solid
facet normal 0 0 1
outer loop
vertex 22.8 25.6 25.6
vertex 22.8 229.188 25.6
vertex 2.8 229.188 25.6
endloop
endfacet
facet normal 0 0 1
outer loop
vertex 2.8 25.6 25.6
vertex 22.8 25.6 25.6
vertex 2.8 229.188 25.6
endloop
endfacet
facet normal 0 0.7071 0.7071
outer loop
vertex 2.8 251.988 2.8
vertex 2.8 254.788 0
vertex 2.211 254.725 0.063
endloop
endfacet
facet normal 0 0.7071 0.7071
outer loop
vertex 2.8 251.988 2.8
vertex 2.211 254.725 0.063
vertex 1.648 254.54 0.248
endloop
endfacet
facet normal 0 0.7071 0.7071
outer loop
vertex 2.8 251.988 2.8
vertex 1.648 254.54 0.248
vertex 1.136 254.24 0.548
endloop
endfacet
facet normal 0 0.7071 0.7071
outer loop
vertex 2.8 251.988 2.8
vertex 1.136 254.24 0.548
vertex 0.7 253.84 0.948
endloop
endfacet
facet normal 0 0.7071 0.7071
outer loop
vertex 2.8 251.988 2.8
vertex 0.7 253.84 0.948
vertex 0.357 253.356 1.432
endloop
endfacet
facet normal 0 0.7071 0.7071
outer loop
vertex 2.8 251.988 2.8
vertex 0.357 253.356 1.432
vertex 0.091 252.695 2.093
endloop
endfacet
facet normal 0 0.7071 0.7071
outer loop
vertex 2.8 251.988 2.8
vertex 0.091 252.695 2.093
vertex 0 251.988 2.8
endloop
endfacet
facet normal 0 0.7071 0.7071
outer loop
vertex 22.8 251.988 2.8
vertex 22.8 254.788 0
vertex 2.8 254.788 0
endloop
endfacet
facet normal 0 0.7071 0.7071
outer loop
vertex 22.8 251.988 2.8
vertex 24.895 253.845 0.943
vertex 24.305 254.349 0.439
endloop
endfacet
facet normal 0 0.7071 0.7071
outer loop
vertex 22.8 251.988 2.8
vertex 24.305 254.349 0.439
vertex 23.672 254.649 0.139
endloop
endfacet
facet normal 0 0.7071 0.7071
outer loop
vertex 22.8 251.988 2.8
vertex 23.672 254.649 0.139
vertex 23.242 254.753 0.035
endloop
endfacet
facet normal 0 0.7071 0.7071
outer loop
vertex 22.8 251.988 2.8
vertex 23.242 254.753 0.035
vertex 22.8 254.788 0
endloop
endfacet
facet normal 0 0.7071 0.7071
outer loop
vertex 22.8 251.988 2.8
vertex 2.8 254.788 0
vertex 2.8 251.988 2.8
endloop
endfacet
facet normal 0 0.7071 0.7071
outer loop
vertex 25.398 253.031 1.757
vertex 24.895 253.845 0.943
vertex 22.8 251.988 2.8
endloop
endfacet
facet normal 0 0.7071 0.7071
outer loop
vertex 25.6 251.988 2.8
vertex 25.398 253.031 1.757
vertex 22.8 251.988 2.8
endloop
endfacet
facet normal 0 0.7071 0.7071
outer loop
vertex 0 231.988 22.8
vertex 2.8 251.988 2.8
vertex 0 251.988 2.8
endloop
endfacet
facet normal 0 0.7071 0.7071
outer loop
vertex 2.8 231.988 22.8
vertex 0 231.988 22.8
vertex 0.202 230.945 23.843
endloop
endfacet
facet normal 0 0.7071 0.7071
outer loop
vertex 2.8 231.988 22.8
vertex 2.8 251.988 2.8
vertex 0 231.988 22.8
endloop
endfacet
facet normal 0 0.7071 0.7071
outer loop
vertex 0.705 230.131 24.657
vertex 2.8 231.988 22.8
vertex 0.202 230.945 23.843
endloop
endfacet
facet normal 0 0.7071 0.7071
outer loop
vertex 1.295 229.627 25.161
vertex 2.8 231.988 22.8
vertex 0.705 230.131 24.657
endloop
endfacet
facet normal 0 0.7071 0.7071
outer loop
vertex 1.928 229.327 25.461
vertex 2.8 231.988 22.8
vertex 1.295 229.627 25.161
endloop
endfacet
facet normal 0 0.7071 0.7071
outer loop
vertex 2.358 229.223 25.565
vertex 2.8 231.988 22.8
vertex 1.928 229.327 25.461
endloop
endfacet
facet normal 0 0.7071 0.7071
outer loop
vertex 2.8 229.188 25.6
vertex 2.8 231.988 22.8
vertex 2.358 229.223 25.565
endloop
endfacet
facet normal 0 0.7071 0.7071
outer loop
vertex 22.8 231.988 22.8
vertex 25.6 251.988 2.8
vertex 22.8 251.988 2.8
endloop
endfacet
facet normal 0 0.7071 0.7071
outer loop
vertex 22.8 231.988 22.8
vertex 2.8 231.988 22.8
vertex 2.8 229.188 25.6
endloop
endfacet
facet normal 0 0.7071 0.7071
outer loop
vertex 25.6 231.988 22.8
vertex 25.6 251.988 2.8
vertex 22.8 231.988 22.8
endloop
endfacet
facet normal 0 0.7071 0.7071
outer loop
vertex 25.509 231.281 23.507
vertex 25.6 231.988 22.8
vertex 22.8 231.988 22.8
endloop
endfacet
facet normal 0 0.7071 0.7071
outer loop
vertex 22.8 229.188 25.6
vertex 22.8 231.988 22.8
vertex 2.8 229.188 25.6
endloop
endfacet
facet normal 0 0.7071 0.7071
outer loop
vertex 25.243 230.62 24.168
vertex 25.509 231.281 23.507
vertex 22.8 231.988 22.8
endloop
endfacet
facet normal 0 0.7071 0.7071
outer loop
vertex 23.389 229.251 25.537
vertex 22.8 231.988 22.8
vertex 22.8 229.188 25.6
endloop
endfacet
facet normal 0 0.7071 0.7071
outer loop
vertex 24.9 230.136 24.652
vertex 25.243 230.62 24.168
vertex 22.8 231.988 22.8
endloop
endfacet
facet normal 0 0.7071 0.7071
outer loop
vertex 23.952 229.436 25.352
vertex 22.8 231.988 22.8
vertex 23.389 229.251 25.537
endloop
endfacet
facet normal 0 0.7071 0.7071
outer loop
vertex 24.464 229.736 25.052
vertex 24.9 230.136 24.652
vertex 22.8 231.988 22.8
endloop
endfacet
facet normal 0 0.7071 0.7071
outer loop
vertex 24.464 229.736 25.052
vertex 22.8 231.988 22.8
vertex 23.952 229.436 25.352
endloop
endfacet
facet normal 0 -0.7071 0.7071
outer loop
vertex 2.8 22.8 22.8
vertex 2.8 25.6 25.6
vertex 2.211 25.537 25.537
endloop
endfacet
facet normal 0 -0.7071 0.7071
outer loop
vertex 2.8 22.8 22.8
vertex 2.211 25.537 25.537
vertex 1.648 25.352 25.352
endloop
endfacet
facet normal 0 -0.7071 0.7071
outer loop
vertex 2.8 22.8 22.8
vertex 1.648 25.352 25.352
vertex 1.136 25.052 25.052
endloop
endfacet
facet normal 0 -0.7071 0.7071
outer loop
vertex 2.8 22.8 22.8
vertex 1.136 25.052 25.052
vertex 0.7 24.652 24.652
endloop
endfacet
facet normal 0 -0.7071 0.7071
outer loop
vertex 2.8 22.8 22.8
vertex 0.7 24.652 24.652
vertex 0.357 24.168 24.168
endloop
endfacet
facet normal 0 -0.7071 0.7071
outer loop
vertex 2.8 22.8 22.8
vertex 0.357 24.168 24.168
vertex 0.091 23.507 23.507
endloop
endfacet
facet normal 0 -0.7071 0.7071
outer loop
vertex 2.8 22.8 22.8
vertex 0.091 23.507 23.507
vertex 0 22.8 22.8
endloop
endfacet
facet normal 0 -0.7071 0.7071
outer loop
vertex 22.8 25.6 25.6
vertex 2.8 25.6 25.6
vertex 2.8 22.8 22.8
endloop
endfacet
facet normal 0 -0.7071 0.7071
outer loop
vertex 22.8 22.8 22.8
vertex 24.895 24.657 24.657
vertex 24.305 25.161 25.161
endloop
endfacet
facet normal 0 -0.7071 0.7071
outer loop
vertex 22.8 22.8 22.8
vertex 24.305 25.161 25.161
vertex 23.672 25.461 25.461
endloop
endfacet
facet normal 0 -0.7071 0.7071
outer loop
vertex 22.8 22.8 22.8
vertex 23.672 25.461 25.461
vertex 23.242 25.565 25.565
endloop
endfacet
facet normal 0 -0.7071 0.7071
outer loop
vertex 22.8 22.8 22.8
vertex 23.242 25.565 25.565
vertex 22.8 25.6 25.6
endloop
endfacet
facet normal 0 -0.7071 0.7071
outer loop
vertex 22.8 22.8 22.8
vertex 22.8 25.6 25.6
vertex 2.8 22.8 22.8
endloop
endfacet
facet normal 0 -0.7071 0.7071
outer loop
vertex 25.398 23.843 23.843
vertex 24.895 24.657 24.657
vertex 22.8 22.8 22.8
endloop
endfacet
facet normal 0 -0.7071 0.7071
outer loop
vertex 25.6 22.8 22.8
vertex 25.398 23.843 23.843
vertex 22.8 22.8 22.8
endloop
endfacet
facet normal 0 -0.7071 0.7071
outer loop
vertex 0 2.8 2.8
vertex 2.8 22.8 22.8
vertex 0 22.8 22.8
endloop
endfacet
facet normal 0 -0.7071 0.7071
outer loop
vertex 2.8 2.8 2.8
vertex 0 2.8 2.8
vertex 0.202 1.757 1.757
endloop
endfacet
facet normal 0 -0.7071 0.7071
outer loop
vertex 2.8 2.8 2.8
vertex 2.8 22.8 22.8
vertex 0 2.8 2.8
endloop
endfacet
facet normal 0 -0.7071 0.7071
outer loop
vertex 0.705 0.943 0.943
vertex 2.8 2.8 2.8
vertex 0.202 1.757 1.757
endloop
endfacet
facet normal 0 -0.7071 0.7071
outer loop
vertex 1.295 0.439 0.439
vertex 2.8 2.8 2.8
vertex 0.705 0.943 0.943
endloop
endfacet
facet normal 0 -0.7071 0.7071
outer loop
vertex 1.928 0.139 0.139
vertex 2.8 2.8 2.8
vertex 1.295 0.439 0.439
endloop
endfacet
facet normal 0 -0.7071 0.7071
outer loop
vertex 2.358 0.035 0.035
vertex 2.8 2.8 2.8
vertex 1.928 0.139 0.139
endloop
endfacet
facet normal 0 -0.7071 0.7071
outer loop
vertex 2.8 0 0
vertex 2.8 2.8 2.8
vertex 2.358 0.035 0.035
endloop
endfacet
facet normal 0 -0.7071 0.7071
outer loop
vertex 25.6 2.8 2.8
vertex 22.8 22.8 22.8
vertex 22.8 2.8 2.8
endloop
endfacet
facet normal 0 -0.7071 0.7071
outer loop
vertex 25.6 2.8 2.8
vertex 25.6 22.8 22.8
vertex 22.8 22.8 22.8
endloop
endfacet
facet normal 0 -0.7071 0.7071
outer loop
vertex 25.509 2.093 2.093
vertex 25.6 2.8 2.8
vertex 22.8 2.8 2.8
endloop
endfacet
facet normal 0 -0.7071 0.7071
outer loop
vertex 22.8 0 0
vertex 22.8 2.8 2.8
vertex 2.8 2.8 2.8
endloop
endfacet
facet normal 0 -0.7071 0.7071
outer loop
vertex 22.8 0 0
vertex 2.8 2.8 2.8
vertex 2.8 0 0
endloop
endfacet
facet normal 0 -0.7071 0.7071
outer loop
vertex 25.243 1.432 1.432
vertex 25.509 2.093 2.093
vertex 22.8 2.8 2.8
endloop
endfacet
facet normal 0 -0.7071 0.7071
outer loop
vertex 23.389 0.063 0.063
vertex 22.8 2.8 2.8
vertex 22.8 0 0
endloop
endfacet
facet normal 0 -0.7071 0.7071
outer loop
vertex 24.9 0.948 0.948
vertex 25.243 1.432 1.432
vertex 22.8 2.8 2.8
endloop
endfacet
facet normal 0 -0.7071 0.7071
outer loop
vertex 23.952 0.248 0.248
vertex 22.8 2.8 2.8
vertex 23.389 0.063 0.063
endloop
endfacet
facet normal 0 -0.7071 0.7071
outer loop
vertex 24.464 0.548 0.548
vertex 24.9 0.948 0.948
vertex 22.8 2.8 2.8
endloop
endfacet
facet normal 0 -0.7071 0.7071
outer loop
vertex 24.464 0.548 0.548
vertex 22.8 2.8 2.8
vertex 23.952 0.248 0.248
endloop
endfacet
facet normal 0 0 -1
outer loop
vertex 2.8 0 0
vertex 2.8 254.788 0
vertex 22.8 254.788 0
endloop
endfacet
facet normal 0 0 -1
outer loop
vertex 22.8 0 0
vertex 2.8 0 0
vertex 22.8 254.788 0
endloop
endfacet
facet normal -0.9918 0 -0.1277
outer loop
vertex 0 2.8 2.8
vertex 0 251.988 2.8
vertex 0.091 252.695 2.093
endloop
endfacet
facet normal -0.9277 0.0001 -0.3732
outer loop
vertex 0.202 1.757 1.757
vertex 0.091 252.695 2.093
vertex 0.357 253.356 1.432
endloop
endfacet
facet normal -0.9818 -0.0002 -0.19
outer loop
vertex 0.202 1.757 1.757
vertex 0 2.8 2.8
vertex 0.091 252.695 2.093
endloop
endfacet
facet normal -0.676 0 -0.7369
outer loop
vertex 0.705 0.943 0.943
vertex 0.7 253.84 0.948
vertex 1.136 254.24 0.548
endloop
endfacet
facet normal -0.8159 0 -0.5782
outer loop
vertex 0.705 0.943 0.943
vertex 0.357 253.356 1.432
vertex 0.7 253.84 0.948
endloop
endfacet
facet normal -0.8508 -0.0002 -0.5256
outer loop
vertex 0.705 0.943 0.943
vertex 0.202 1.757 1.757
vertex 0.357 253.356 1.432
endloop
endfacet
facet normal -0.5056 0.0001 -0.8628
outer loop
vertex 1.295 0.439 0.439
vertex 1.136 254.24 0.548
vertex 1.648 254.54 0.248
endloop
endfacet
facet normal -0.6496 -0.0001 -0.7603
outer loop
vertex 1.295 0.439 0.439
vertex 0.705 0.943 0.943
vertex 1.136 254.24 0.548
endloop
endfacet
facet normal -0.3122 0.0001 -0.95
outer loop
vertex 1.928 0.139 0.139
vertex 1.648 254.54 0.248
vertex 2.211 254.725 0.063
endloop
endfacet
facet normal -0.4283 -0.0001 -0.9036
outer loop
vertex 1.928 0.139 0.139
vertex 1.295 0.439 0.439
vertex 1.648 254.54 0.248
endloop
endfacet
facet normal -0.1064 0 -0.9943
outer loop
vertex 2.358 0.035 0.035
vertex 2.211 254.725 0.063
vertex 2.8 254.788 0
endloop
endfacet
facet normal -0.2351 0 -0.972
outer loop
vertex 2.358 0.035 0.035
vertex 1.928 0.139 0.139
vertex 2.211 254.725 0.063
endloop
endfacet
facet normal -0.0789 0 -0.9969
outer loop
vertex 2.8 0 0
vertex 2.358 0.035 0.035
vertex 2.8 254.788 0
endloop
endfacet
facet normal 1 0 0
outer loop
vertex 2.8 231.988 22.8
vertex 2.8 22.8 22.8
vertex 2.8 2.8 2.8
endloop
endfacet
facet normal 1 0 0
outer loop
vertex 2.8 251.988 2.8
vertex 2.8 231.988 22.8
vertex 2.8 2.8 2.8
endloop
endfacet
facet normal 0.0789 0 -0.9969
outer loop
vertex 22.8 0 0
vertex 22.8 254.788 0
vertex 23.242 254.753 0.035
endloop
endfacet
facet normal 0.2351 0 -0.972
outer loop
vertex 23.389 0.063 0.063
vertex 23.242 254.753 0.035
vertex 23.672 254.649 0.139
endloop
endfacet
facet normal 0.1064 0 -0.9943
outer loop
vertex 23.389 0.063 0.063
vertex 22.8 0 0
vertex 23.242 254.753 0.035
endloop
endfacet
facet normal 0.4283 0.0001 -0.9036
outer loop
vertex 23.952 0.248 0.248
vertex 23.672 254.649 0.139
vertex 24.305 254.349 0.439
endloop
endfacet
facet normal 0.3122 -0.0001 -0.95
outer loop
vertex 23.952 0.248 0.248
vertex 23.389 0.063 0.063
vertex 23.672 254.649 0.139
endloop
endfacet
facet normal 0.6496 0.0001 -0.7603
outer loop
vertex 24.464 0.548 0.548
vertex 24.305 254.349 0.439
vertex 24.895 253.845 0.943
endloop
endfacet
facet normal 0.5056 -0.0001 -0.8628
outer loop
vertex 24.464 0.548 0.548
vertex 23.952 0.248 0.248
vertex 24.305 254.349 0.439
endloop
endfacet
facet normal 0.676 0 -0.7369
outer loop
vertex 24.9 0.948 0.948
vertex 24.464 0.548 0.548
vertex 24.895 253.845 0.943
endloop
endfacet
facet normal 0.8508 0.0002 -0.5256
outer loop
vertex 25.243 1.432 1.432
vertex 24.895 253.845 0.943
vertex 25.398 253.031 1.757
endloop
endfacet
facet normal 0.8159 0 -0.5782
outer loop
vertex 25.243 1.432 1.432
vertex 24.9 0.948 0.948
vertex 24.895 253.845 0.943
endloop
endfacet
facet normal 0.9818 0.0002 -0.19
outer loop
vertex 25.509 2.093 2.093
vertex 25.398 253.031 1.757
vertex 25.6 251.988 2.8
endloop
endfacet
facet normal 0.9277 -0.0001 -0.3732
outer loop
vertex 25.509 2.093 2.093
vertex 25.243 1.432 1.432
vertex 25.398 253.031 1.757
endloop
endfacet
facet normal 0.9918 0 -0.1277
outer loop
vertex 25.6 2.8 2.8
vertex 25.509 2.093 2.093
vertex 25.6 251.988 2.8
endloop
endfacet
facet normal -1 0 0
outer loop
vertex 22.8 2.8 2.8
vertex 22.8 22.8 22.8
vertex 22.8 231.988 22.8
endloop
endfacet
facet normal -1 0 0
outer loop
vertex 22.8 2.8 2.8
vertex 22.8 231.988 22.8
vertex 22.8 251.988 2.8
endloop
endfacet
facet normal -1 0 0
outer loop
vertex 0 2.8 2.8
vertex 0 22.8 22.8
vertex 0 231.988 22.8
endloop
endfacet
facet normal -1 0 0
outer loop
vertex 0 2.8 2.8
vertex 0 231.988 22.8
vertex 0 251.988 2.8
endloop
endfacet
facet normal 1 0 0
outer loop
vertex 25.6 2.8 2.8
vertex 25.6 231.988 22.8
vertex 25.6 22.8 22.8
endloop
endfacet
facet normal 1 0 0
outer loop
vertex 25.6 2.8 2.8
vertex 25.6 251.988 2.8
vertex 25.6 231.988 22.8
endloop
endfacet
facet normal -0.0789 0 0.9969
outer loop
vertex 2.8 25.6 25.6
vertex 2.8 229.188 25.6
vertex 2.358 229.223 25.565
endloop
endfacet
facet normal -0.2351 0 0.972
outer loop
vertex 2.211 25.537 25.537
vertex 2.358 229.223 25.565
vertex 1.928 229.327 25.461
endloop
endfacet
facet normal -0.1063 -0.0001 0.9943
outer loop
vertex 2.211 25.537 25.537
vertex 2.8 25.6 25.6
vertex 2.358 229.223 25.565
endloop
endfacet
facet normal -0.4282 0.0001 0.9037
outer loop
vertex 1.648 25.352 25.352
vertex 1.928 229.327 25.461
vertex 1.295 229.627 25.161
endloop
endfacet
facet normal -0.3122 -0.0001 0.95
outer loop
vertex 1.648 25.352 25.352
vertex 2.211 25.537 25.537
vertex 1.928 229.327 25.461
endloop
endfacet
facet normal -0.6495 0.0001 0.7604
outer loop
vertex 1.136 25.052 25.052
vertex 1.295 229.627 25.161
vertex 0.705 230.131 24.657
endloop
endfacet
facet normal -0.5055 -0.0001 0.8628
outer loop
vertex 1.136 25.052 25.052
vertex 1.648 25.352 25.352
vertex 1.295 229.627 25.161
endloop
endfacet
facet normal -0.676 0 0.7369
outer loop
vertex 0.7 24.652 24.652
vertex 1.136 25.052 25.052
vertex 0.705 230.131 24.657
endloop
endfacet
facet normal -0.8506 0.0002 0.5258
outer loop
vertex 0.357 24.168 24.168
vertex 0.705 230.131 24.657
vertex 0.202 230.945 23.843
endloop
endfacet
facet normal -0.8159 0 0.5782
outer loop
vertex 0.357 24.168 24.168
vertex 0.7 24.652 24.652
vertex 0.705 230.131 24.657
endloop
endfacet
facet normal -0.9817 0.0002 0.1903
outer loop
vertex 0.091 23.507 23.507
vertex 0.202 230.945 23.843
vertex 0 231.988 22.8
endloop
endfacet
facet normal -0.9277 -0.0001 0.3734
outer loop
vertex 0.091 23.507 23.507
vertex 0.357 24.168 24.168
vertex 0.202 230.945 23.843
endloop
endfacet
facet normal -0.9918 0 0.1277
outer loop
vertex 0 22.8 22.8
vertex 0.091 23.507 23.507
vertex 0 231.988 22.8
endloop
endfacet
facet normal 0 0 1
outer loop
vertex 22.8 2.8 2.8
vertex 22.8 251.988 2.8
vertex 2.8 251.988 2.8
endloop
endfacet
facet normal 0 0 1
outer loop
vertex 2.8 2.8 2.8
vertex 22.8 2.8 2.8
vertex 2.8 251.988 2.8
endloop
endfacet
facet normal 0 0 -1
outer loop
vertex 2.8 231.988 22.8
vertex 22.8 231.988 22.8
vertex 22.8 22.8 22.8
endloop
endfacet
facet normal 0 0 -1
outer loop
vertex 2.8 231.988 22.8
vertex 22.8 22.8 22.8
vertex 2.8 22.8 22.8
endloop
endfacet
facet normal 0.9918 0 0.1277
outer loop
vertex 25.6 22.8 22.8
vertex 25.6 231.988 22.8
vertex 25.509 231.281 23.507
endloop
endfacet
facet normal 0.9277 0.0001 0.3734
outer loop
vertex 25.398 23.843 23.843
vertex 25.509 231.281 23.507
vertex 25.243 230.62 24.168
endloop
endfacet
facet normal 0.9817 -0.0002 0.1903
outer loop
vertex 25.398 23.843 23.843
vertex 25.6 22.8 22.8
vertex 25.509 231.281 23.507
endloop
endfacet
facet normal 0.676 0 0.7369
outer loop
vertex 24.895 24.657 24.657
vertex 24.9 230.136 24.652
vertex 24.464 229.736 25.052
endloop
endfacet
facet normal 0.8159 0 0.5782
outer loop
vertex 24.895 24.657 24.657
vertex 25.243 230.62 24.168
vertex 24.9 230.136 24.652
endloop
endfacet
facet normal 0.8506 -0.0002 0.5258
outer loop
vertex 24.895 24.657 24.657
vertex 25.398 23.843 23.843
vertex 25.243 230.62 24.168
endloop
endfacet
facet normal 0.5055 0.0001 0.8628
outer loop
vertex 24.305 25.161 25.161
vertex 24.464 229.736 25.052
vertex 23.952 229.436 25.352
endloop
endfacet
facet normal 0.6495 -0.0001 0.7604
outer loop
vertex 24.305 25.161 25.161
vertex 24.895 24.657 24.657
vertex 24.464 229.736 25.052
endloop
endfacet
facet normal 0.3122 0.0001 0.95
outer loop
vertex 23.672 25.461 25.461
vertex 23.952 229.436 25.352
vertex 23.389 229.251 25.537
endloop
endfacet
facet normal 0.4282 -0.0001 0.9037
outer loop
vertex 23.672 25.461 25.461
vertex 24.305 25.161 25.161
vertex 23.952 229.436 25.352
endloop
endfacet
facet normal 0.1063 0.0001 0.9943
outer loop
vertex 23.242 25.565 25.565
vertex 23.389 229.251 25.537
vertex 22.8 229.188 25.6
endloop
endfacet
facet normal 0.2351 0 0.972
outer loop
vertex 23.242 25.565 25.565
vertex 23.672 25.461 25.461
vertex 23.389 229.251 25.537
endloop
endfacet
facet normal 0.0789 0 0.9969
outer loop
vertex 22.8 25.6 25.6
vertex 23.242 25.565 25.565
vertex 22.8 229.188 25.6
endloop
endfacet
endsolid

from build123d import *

# Parameters (mm, degrees)
BOSS_EXTRUDE1_DEPTH     = 254.788
SKETCH3_W               = 20
SKETCH3_H               = 20
CUT_EXTRUDE1_DEPTH      = 1040.5
CUT_EXTRUDE4_DEPTH      = 258.211828935
CUT_EXTRUDE4_DEPTH_BACK = 258.211828935
CUT_EXTRUDE8_DEPTH      = 258.211828935
CUT_EXTRUDE8_DEPTH_BACK = 258.211828935


with BuildPart() as part:
    # Sketch1 → Boss-Extrude1 (new body)
    with BuildSketch(Plane(origin=(0, 0, 0), x_dir=(1, 0, 0), z_dir=(0, 1, 0))):
        with BuildLine():
            Line((2.8, 0), (22.8, 0))
            ThreePointArc((22.8, 0), (24.779898987, -0.820101013), (25.6, -2.8))
            Line((25.6, -2.8), (25.6, -22.8))
            ThreePointArc((25.6, -22.8), (24.779898987, -24.779898987), (22.8, -25.6))
            Line((22.8, -25.6), (2.8, -25.6))
            ThreePointArc((2.8, -25.6), (0.820101013, -24.779898987), (0, -22.8))
            Line((0, -22.8), (0, -2.8))
            ThreePointArc((0, -2.8), (0.820101013, -0.820101013), (2.8, 0))
        make_face()
    extrude(amount=BOSS_EXTRUDE1_DEPTH)

    # Sketch3 → Cut-Extrude1 (cut)
    with BuildSketch(Plane(origin=(0, 0, 0), x_dir=(-1, 0, 0), z_dir=(0, -1, 0))):
        with Locations((-12.8, -12.8)):
            Rectangle(SKETCH3_W, SKETCH3_H)
    extrude(amount=-CUT_EXTRUDE1_DEPTH, mode=Mode.SUBTRACT)

    # Sketch4 → Cut-Extrude4 (cut, two sides: drawn at the far end of the back side and taken through both)
    with BuildSketch(Plane.ZY.offset(-1.4).offset(-CUT_EXTRUDE4_DEPTH_BACK)):
        Polygon((-369.209949856, -369.209949856), (0, 0), (26.086303166, 26.086303166), (395.296253022, 395.296253022), (1133.716152734, -343.123646689), (369.209949856, -1107.629849567), align=None)
    extrude(amount=CUT_EXTRUDE4_DEPTH + CUT_EXTRUDE4_DEPTH_BACK, mode=Mode.SUBTRACT)

    # Sketch5 → Cut-Extrude8 (cut, two sides: drawn at the far end of the back side and taken through both)
    with BuildSketch(Plane.ZY.offset(-1.4).offset(-CUT_EXTRUDE8_DEPTH_BACK)):
        Polygon((-369.209949856, 623.997949856), (0, 254.788), (25.6, 229.188), (394.809949856, -140.021949856), (1133.229849567, 598.397949856), (369.209949856, 1362.417849567), align=None)
    extrude(amount=CUT_EXTRUDE8_DEPTH + CUT_EXTRUDE8_DEPTH_BACK, mode=Mode.SUBTRACT)


solid = part.part
